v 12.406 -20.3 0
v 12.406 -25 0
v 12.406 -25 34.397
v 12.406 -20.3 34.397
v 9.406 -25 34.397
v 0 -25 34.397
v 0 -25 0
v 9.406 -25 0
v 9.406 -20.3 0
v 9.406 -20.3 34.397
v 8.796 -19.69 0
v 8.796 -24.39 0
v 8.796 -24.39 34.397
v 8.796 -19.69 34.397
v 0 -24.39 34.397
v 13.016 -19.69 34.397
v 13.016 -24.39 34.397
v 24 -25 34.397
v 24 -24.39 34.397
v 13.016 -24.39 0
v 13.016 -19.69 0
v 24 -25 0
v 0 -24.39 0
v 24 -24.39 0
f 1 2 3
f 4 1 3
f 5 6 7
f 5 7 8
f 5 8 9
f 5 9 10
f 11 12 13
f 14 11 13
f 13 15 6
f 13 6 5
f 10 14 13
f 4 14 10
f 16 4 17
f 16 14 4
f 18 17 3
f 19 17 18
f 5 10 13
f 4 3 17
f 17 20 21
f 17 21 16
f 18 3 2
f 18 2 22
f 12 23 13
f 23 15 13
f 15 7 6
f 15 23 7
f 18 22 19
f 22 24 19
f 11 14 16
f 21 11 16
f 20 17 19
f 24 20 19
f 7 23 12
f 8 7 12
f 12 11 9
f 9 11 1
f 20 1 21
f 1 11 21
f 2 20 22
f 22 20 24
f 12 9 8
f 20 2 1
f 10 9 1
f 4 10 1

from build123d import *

# Parameters (mm, degrees)
F0_W     = 24
F0_H     = 34.397194515
F1_DEPTH = 25
F2_W     = 3
F2_H     = 34.397194515
F3_DEPTH = 4.7
F4_T     = -0.61


with BuildPart() as f1:
    # F0 (on Front) → F1 (new body)
    with BuildSketch(Plane.XZ):
        with Locations((12, 17.1985972575)):
            Rectangle(F0_W, F0_H)
    extrude(amount=F1_DEPTH)

    # F2 (on face) → F3 (cut)
    with BuildSketch(Plane.XZ.offset(25)):
        with Locations((10.9055030495, 17.1985972575)):
            Rectangle(F2_W, F2_H)
    extrude(amount=-F3_DEPTH, mode=Mode.SUBTRACT)

    # F4
    f4_openings = [f1.faces().sort_by_distance(p)[0] for p in [
        (12, 0, 17.198597),
        (0, -12.5, 17.198597),
        (12.02634, -12.255735, 0),
        (24, -12.5, 17.198597),
        (12.02634, -12.255735, 34.397195),
    ]]
    offset(amount=F4_T, openings=f4_openings, kind=Kind.INTERSECTION)


solid = f1.part
